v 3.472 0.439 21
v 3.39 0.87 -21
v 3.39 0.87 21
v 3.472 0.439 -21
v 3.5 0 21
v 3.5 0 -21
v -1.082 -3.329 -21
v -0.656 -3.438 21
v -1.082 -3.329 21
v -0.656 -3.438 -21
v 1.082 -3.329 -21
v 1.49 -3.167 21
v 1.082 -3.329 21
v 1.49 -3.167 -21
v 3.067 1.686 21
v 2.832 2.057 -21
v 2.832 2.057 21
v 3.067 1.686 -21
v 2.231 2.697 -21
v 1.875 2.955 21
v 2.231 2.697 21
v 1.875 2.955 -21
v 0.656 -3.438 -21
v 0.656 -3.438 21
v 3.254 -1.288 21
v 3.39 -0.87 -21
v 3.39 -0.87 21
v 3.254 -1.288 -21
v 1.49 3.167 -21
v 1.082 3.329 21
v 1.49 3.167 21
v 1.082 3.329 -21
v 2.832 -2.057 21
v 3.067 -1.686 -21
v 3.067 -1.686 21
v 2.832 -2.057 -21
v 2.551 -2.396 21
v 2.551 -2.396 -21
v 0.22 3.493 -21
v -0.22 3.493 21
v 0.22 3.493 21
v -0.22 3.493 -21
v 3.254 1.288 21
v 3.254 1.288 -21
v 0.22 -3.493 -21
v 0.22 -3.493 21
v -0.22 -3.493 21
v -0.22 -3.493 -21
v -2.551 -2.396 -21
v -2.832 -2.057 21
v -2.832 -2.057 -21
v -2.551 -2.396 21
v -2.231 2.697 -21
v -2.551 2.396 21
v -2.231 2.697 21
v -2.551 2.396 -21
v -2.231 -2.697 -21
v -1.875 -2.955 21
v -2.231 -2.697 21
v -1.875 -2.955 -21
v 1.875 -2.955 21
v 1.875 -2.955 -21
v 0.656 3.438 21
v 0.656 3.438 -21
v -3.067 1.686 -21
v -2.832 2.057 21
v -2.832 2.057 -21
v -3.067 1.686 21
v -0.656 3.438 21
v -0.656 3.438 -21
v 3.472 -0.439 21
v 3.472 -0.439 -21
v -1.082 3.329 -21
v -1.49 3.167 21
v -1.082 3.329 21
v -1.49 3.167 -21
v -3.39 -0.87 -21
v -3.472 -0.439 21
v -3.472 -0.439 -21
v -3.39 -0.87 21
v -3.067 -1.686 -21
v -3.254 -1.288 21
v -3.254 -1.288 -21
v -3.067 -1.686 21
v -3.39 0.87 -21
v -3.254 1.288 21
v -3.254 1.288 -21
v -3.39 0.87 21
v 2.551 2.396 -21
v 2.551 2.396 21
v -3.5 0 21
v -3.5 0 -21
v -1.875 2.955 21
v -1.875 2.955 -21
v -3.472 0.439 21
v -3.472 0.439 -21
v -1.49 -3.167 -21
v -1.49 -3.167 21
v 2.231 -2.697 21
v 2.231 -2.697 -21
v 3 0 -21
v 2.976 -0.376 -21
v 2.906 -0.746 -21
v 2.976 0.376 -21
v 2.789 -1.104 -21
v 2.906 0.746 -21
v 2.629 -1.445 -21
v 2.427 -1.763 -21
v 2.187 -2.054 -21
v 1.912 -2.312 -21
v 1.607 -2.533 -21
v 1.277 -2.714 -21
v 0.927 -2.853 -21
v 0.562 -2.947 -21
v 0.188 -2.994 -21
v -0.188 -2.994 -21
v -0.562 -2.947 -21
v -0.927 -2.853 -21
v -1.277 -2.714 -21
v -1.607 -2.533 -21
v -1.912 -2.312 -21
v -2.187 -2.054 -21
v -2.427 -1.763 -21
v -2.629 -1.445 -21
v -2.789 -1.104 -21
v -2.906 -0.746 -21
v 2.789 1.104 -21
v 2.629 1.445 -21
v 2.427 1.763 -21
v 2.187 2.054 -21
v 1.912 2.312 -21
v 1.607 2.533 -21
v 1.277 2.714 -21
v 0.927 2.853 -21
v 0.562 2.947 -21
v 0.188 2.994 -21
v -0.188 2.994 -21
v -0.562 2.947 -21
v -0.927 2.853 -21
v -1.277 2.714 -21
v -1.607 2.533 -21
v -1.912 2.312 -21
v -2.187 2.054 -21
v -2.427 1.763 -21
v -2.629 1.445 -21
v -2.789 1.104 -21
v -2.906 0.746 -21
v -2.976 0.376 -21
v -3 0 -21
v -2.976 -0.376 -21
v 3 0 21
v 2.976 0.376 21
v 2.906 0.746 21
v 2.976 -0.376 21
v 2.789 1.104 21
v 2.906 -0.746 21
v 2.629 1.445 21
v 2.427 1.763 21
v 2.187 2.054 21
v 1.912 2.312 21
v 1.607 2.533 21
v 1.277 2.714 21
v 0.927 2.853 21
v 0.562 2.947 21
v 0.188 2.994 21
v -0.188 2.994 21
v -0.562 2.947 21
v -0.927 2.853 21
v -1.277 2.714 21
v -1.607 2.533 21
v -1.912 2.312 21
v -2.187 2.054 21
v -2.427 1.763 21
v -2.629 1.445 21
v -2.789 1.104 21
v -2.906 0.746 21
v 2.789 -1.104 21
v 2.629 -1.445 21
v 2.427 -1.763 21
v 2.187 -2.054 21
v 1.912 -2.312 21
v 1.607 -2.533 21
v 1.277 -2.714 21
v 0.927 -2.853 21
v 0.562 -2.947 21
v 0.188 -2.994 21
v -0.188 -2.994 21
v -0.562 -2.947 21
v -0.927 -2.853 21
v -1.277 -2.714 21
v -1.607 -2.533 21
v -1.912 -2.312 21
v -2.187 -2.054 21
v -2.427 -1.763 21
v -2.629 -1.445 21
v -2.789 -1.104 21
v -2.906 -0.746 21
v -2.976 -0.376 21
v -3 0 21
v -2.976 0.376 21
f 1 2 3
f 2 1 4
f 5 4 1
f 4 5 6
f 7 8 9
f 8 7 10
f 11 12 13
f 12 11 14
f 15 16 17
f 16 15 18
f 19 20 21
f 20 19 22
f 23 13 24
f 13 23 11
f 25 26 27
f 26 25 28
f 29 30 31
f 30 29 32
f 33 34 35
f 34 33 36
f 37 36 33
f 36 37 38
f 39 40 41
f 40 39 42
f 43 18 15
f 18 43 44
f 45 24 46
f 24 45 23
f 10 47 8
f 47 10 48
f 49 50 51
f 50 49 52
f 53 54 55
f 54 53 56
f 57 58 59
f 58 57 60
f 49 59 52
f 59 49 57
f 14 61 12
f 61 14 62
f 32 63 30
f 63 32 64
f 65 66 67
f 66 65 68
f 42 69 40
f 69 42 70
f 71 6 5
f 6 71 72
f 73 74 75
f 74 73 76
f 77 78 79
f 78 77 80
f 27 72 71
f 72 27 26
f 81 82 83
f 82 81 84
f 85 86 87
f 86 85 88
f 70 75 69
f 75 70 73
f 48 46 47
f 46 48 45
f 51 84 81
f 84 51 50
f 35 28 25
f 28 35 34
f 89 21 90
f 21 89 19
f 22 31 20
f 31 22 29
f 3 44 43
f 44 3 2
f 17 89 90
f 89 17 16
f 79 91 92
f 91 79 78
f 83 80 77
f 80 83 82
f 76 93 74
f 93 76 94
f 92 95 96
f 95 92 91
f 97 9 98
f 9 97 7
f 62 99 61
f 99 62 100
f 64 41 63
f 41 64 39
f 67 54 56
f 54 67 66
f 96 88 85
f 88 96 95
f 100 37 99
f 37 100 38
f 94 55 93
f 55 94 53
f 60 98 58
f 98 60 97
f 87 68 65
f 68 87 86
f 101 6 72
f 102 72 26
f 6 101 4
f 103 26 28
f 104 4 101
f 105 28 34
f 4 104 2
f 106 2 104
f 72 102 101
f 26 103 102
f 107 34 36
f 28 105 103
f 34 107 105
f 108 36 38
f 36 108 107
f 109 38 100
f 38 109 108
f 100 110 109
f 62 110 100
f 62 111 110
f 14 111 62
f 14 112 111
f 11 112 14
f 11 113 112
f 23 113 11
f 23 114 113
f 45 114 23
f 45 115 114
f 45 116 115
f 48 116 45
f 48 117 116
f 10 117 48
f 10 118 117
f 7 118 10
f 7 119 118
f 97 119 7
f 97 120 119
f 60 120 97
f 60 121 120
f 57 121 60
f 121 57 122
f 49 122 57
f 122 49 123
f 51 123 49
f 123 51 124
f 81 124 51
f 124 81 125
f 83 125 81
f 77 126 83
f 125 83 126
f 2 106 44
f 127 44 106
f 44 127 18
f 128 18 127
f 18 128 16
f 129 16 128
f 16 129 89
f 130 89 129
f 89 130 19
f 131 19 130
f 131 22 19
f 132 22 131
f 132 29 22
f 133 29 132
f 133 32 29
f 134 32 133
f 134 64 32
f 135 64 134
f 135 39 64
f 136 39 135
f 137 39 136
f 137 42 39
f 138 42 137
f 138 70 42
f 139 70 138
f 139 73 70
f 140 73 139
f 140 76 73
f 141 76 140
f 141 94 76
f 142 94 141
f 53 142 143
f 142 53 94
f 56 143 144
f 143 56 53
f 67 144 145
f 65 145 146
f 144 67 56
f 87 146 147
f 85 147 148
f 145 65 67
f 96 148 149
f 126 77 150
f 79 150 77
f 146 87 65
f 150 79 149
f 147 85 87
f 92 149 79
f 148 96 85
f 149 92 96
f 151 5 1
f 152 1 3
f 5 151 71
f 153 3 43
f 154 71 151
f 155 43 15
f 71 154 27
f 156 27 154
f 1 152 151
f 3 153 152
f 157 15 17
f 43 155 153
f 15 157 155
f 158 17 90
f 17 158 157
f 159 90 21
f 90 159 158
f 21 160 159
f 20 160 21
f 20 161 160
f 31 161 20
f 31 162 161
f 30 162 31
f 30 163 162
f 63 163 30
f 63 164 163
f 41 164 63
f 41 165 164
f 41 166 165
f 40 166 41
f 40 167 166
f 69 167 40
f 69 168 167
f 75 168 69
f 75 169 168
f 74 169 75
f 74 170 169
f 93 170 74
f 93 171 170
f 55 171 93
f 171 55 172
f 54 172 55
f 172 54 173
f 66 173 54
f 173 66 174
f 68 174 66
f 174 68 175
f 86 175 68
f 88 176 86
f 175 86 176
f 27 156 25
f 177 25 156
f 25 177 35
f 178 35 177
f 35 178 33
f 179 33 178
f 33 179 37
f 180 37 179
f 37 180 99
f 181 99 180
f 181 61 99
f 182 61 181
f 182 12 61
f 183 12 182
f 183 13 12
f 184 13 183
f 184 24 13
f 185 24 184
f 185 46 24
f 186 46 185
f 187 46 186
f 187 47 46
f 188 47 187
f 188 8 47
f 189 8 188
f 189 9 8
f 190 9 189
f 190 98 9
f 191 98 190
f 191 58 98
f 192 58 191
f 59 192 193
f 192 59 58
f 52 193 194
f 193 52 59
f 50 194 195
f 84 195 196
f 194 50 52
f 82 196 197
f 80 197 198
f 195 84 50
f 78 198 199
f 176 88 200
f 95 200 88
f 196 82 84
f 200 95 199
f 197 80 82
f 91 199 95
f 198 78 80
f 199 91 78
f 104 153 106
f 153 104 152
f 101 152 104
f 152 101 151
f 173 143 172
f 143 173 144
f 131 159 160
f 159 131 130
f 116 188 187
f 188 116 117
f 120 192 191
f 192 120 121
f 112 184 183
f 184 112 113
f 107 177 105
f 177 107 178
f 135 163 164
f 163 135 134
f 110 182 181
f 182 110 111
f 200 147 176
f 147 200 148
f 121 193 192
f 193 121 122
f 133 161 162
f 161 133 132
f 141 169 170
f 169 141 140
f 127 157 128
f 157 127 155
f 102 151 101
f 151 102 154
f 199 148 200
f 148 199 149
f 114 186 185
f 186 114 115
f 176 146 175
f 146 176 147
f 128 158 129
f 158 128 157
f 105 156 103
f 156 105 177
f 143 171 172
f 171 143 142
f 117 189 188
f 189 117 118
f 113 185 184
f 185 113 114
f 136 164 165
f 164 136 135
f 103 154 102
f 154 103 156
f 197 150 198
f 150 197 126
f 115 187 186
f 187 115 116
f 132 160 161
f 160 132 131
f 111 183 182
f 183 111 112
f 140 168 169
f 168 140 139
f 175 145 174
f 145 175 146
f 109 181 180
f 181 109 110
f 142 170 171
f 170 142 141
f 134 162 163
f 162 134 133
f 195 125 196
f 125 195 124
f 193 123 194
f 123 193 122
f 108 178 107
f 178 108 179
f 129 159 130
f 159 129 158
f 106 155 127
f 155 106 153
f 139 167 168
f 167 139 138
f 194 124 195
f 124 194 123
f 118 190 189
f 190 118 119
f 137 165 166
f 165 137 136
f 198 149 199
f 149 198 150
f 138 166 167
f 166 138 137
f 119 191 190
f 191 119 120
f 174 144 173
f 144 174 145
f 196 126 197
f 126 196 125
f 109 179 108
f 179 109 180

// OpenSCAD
$fn = 50;


difference() {
	union() {
		translate(v = [0, 0, -21.0000000000]) {
			cylinder(h = 42, r = 3.5000000000);
		}
	}
	union() {
		translate(v = [0, 0, -100.0000000000]) {
			cylinder(h = 200, r = 3.0000000000);
		}
	}
}
